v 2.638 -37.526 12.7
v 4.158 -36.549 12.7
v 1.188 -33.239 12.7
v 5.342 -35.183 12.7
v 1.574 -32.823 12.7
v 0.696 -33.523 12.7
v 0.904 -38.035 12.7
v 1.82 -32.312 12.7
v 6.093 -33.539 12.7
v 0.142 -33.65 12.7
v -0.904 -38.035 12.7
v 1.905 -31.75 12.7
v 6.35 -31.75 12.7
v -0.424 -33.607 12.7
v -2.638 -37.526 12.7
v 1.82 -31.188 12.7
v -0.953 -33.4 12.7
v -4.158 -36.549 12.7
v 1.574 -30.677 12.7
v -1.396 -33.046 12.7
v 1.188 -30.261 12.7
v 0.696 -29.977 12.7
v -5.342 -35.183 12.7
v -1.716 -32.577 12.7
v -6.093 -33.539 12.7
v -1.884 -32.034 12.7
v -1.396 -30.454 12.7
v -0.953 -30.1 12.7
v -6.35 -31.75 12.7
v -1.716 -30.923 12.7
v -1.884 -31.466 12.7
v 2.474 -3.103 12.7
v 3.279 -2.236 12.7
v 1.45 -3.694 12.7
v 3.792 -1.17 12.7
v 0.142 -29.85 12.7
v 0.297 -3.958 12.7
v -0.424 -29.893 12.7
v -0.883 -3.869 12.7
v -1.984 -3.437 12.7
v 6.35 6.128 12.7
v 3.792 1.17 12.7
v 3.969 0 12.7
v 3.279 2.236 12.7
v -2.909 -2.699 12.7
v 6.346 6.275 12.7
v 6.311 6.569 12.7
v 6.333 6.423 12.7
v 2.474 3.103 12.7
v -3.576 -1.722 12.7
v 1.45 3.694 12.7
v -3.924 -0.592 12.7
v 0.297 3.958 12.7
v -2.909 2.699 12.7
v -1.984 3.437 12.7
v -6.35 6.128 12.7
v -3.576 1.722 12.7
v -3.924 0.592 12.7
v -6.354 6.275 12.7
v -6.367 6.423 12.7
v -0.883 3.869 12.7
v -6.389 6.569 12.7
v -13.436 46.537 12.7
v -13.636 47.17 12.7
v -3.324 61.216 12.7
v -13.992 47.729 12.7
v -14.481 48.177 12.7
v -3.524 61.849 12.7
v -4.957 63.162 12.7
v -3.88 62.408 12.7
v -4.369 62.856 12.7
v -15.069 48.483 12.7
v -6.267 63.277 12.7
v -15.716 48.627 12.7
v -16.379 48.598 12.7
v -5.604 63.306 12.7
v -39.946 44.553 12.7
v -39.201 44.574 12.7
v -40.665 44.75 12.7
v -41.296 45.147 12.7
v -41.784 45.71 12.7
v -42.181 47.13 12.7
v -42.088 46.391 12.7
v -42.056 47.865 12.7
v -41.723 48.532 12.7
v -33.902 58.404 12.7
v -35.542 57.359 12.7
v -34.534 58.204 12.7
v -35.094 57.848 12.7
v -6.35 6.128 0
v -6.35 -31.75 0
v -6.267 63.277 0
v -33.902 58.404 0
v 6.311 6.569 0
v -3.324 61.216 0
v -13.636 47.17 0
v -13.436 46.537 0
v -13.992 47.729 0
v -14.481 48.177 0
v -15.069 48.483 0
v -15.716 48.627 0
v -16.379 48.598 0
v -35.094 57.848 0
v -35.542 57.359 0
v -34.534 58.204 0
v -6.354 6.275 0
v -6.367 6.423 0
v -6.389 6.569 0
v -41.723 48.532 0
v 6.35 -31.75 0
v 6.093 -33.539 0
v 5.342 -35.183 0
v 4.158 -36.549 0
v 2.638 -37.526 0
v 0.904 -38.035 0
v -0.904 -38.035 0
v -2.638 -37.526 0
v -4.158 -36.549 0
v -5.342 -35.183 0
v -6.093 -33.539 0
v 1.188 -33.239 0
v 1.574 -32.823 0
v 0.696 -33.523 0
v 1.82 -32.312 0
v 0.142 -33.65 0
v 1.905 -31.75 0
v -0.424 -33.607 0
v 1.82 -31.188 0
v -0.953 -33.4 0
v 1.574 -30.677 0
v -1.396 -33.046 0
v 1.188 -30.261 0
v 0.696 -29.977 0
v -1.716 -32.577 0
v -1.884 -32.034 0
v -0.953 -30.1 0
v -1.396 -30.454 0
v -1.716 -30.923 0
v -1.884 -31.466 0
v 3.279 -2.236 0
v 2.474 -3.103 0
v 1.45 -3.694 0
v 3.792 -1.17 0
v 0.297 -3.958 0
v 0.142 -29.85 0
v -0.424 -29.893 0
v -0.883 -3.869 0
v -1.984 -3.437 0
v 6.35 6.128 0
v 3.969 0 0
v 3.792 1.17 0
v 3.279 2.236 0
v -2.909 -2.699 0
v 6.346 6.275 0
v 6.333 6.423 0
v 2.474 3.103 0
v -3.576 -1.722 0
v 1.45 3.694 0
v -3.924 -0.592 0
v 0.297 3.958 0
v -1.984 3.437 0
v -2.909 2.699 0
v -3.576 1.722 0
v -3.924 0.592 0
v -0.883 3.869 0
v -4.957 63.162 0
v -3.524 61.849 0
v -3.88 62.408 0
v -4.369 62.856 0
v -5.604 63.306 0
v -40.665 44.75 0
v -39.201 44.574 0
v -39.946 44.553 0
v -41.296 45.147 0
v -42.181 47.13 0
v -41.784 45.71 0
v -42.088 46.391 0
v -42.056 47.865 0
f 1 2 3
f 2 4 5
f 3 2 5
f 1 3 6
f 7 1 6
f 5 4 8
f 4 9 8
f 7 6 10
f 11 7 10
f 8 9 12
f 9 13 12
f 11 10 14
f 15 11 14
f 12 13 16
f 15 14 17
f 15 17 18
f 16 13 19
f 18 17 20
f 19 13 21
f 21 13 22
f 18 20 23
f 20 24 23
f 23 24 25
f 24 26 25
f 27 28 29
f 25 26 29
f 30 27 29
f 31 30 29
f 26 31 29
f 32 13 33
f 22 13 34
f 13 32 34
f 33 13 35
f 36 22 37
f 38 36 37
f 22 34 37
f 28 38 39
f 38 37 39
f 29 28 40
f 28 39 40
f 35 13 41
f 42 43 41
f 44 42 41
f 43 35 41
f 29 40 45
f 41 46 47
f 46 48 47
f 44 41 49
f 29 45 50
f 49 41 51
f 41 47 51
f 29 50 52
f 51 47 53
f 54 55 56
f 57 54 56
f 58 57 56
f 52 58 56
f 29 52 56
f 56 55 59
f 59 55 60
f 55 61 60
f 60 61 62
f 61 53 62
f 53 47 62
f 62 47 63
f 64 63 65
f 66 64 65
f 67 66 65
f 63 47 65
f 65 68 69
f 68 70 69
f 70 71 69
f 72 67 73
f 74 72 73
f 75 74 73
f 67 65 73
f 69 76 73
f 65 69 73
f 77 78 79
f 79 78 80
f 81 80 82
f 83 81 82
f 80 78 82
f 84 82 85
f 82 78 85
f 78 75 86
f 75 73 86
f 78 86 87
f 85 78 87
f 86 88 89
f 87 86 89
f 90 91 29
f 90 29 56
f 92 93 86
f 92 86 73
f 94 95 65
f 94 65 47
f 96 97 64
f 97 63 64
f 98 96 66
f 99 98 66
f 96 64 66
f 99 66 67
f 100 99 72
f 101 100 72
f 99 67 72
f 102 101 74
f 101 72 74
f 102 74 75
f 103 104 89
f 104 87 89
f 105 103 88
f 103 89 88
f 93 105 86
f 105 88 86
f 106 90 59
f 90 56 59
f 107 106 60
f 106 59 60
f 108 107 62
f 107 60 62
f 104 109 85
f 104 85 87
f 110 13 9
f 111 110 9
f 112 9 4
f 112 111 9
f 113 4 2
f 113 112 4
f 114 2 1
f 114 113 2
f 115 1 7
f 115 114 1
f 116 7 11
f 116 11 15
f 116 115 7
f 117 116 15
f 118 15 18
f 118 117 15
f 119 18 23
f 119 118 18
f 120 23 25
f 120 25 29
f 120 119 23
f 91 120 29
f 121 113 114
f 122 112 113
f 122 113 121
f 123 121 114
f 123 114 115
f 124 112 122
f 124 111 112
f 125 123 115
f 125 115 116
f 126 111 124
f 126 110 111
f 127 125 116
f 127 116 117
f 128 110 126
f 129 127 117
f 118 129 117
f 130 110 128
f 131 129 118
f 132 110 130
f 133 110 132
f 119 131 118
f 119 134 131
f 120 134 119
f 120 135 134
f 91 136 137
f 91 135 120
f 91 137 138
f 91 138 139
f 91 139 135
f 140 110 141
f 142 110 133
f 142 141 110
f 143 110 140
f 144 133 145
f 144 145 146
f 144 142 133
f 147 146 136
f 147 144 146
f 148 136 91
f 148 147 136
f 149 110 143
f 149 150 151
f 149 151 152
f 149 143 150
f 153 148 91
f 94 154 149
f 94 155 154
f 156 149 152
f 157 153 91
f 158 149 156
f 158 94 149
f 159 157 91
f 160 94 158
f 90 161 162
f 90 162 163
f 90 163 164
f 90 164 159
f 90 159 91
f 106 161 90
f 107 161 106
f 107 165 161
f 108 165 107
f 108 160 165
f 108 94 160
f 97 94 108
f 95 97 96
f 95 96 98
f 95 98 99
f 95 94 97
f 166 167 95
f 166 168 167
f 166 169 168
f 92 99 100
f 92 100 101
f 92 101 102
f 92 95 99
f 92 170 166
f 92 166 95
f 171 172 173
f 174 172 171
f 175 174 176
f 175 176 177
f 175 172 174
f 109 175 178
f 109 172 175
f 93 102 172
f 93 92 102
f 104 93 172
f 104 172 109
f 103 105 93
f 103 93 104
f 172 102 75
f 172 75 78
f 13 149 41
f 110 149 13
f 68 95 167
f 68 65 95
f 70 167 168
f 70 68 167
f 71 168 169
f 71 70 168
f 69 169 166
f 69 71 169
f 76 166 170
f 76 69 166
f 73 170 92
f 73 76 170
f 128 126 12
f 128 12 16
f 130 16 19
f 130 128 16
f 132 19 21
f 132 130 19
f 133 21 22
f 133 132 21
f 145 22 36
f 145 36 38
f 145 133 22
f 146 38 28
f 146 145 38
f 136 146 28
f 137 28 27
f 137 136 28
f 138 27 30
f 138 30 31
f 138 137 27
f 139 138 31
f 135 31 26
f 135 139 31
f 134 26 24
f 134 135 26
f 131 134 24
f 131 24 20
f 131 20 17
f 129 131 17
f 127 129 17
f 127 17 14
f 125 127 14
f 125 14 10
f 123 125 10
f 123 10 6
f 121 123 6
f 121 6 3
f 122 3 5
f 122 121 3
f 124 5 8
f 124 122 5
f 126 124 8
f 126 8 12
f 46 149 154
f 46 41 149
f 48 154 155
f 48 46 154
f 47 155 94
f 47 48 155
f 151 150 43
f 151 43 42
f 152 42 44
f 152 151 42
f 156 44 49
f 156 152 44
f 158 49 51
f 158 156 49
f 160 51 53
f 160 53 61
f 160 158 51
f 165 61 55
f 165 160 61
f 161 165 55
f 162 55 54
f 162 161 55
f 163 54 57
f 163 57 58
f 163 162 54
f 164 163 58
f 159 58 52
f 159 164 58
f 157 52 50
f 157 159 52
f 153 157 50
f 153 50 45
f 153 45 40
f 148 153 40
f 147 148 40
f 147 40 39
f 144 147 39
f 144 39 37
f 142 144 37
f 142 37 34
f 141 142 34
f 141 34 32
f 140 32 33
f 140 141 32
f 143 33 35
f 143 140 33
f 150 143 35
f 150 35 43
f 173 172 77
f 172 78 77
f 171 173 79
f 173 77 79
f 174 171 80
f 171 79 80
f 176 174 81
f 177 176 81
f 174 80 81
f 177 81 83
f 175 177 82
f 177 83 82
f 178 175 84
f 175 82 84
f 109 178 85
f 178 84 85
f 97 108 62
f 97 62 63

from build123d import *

# Parameters (mm, degrees)
SKETCH1_R           = 3.96875
SKETCH1_R_2         = 1.905
BOSS_EXTRUDE1_DEPTH = 12.7
FILLET1_R           = 2.54


with BuildPart() as part:
    # Sketch1 → Boss-Extrude1 (new body)
    with BuildSketch(Plane.XY):
        with BuildLine():
            Line((-6.35, -31.75), (-6.35, 6.35))
            Line((-6.35, 6.35), (-13.877185568, 49.038790666))
            Line((-13.877185568, 49.038790666), (-45.239836887, 43.508709052))
            Line((-45.239836887, 43.508709052), (-34.93811028, 58.221099372))
            Line((-34.93811028, 58.221099372), (-3.765469283, 63.71767704))
            Line((-3.765469283, 63.71767704), (6.35, 6.35))
            Line((6.35, 6.35), (6.35, -31.75))
            ThreePointArc((6.35, -31.75), (0, -38.1), (-6.35, -31.75))
        make_face()
        Circle(SKETCH1_R, mode=Mode.SUBTRACT)
        with Locations((0, -31.75)):
            Circle(SKETCH1_R_2, mode=Mode.SUBTRACT)
    extrude(amount=BOSS_EXTRUDE1_DEPTH)

    # Fillet1
    fillet1_edges = [part.edges().sort_by_distance(p)[0] for p in [
        (-6.35, 6.35, 6.35),
        (-13.877185568, 49.038790666, 6.35),
        (-45.239836887, 43.508709052, 6.35),
        (-34.93811028, 58.221099372, 6.35),
        (-3.765469283, 63.71767704, 6.35),
        (6.35, 6.35, 6.35),
    ]]
    fillet(fillet1_edges, radius=FILLET1_R)


solid = part.part
